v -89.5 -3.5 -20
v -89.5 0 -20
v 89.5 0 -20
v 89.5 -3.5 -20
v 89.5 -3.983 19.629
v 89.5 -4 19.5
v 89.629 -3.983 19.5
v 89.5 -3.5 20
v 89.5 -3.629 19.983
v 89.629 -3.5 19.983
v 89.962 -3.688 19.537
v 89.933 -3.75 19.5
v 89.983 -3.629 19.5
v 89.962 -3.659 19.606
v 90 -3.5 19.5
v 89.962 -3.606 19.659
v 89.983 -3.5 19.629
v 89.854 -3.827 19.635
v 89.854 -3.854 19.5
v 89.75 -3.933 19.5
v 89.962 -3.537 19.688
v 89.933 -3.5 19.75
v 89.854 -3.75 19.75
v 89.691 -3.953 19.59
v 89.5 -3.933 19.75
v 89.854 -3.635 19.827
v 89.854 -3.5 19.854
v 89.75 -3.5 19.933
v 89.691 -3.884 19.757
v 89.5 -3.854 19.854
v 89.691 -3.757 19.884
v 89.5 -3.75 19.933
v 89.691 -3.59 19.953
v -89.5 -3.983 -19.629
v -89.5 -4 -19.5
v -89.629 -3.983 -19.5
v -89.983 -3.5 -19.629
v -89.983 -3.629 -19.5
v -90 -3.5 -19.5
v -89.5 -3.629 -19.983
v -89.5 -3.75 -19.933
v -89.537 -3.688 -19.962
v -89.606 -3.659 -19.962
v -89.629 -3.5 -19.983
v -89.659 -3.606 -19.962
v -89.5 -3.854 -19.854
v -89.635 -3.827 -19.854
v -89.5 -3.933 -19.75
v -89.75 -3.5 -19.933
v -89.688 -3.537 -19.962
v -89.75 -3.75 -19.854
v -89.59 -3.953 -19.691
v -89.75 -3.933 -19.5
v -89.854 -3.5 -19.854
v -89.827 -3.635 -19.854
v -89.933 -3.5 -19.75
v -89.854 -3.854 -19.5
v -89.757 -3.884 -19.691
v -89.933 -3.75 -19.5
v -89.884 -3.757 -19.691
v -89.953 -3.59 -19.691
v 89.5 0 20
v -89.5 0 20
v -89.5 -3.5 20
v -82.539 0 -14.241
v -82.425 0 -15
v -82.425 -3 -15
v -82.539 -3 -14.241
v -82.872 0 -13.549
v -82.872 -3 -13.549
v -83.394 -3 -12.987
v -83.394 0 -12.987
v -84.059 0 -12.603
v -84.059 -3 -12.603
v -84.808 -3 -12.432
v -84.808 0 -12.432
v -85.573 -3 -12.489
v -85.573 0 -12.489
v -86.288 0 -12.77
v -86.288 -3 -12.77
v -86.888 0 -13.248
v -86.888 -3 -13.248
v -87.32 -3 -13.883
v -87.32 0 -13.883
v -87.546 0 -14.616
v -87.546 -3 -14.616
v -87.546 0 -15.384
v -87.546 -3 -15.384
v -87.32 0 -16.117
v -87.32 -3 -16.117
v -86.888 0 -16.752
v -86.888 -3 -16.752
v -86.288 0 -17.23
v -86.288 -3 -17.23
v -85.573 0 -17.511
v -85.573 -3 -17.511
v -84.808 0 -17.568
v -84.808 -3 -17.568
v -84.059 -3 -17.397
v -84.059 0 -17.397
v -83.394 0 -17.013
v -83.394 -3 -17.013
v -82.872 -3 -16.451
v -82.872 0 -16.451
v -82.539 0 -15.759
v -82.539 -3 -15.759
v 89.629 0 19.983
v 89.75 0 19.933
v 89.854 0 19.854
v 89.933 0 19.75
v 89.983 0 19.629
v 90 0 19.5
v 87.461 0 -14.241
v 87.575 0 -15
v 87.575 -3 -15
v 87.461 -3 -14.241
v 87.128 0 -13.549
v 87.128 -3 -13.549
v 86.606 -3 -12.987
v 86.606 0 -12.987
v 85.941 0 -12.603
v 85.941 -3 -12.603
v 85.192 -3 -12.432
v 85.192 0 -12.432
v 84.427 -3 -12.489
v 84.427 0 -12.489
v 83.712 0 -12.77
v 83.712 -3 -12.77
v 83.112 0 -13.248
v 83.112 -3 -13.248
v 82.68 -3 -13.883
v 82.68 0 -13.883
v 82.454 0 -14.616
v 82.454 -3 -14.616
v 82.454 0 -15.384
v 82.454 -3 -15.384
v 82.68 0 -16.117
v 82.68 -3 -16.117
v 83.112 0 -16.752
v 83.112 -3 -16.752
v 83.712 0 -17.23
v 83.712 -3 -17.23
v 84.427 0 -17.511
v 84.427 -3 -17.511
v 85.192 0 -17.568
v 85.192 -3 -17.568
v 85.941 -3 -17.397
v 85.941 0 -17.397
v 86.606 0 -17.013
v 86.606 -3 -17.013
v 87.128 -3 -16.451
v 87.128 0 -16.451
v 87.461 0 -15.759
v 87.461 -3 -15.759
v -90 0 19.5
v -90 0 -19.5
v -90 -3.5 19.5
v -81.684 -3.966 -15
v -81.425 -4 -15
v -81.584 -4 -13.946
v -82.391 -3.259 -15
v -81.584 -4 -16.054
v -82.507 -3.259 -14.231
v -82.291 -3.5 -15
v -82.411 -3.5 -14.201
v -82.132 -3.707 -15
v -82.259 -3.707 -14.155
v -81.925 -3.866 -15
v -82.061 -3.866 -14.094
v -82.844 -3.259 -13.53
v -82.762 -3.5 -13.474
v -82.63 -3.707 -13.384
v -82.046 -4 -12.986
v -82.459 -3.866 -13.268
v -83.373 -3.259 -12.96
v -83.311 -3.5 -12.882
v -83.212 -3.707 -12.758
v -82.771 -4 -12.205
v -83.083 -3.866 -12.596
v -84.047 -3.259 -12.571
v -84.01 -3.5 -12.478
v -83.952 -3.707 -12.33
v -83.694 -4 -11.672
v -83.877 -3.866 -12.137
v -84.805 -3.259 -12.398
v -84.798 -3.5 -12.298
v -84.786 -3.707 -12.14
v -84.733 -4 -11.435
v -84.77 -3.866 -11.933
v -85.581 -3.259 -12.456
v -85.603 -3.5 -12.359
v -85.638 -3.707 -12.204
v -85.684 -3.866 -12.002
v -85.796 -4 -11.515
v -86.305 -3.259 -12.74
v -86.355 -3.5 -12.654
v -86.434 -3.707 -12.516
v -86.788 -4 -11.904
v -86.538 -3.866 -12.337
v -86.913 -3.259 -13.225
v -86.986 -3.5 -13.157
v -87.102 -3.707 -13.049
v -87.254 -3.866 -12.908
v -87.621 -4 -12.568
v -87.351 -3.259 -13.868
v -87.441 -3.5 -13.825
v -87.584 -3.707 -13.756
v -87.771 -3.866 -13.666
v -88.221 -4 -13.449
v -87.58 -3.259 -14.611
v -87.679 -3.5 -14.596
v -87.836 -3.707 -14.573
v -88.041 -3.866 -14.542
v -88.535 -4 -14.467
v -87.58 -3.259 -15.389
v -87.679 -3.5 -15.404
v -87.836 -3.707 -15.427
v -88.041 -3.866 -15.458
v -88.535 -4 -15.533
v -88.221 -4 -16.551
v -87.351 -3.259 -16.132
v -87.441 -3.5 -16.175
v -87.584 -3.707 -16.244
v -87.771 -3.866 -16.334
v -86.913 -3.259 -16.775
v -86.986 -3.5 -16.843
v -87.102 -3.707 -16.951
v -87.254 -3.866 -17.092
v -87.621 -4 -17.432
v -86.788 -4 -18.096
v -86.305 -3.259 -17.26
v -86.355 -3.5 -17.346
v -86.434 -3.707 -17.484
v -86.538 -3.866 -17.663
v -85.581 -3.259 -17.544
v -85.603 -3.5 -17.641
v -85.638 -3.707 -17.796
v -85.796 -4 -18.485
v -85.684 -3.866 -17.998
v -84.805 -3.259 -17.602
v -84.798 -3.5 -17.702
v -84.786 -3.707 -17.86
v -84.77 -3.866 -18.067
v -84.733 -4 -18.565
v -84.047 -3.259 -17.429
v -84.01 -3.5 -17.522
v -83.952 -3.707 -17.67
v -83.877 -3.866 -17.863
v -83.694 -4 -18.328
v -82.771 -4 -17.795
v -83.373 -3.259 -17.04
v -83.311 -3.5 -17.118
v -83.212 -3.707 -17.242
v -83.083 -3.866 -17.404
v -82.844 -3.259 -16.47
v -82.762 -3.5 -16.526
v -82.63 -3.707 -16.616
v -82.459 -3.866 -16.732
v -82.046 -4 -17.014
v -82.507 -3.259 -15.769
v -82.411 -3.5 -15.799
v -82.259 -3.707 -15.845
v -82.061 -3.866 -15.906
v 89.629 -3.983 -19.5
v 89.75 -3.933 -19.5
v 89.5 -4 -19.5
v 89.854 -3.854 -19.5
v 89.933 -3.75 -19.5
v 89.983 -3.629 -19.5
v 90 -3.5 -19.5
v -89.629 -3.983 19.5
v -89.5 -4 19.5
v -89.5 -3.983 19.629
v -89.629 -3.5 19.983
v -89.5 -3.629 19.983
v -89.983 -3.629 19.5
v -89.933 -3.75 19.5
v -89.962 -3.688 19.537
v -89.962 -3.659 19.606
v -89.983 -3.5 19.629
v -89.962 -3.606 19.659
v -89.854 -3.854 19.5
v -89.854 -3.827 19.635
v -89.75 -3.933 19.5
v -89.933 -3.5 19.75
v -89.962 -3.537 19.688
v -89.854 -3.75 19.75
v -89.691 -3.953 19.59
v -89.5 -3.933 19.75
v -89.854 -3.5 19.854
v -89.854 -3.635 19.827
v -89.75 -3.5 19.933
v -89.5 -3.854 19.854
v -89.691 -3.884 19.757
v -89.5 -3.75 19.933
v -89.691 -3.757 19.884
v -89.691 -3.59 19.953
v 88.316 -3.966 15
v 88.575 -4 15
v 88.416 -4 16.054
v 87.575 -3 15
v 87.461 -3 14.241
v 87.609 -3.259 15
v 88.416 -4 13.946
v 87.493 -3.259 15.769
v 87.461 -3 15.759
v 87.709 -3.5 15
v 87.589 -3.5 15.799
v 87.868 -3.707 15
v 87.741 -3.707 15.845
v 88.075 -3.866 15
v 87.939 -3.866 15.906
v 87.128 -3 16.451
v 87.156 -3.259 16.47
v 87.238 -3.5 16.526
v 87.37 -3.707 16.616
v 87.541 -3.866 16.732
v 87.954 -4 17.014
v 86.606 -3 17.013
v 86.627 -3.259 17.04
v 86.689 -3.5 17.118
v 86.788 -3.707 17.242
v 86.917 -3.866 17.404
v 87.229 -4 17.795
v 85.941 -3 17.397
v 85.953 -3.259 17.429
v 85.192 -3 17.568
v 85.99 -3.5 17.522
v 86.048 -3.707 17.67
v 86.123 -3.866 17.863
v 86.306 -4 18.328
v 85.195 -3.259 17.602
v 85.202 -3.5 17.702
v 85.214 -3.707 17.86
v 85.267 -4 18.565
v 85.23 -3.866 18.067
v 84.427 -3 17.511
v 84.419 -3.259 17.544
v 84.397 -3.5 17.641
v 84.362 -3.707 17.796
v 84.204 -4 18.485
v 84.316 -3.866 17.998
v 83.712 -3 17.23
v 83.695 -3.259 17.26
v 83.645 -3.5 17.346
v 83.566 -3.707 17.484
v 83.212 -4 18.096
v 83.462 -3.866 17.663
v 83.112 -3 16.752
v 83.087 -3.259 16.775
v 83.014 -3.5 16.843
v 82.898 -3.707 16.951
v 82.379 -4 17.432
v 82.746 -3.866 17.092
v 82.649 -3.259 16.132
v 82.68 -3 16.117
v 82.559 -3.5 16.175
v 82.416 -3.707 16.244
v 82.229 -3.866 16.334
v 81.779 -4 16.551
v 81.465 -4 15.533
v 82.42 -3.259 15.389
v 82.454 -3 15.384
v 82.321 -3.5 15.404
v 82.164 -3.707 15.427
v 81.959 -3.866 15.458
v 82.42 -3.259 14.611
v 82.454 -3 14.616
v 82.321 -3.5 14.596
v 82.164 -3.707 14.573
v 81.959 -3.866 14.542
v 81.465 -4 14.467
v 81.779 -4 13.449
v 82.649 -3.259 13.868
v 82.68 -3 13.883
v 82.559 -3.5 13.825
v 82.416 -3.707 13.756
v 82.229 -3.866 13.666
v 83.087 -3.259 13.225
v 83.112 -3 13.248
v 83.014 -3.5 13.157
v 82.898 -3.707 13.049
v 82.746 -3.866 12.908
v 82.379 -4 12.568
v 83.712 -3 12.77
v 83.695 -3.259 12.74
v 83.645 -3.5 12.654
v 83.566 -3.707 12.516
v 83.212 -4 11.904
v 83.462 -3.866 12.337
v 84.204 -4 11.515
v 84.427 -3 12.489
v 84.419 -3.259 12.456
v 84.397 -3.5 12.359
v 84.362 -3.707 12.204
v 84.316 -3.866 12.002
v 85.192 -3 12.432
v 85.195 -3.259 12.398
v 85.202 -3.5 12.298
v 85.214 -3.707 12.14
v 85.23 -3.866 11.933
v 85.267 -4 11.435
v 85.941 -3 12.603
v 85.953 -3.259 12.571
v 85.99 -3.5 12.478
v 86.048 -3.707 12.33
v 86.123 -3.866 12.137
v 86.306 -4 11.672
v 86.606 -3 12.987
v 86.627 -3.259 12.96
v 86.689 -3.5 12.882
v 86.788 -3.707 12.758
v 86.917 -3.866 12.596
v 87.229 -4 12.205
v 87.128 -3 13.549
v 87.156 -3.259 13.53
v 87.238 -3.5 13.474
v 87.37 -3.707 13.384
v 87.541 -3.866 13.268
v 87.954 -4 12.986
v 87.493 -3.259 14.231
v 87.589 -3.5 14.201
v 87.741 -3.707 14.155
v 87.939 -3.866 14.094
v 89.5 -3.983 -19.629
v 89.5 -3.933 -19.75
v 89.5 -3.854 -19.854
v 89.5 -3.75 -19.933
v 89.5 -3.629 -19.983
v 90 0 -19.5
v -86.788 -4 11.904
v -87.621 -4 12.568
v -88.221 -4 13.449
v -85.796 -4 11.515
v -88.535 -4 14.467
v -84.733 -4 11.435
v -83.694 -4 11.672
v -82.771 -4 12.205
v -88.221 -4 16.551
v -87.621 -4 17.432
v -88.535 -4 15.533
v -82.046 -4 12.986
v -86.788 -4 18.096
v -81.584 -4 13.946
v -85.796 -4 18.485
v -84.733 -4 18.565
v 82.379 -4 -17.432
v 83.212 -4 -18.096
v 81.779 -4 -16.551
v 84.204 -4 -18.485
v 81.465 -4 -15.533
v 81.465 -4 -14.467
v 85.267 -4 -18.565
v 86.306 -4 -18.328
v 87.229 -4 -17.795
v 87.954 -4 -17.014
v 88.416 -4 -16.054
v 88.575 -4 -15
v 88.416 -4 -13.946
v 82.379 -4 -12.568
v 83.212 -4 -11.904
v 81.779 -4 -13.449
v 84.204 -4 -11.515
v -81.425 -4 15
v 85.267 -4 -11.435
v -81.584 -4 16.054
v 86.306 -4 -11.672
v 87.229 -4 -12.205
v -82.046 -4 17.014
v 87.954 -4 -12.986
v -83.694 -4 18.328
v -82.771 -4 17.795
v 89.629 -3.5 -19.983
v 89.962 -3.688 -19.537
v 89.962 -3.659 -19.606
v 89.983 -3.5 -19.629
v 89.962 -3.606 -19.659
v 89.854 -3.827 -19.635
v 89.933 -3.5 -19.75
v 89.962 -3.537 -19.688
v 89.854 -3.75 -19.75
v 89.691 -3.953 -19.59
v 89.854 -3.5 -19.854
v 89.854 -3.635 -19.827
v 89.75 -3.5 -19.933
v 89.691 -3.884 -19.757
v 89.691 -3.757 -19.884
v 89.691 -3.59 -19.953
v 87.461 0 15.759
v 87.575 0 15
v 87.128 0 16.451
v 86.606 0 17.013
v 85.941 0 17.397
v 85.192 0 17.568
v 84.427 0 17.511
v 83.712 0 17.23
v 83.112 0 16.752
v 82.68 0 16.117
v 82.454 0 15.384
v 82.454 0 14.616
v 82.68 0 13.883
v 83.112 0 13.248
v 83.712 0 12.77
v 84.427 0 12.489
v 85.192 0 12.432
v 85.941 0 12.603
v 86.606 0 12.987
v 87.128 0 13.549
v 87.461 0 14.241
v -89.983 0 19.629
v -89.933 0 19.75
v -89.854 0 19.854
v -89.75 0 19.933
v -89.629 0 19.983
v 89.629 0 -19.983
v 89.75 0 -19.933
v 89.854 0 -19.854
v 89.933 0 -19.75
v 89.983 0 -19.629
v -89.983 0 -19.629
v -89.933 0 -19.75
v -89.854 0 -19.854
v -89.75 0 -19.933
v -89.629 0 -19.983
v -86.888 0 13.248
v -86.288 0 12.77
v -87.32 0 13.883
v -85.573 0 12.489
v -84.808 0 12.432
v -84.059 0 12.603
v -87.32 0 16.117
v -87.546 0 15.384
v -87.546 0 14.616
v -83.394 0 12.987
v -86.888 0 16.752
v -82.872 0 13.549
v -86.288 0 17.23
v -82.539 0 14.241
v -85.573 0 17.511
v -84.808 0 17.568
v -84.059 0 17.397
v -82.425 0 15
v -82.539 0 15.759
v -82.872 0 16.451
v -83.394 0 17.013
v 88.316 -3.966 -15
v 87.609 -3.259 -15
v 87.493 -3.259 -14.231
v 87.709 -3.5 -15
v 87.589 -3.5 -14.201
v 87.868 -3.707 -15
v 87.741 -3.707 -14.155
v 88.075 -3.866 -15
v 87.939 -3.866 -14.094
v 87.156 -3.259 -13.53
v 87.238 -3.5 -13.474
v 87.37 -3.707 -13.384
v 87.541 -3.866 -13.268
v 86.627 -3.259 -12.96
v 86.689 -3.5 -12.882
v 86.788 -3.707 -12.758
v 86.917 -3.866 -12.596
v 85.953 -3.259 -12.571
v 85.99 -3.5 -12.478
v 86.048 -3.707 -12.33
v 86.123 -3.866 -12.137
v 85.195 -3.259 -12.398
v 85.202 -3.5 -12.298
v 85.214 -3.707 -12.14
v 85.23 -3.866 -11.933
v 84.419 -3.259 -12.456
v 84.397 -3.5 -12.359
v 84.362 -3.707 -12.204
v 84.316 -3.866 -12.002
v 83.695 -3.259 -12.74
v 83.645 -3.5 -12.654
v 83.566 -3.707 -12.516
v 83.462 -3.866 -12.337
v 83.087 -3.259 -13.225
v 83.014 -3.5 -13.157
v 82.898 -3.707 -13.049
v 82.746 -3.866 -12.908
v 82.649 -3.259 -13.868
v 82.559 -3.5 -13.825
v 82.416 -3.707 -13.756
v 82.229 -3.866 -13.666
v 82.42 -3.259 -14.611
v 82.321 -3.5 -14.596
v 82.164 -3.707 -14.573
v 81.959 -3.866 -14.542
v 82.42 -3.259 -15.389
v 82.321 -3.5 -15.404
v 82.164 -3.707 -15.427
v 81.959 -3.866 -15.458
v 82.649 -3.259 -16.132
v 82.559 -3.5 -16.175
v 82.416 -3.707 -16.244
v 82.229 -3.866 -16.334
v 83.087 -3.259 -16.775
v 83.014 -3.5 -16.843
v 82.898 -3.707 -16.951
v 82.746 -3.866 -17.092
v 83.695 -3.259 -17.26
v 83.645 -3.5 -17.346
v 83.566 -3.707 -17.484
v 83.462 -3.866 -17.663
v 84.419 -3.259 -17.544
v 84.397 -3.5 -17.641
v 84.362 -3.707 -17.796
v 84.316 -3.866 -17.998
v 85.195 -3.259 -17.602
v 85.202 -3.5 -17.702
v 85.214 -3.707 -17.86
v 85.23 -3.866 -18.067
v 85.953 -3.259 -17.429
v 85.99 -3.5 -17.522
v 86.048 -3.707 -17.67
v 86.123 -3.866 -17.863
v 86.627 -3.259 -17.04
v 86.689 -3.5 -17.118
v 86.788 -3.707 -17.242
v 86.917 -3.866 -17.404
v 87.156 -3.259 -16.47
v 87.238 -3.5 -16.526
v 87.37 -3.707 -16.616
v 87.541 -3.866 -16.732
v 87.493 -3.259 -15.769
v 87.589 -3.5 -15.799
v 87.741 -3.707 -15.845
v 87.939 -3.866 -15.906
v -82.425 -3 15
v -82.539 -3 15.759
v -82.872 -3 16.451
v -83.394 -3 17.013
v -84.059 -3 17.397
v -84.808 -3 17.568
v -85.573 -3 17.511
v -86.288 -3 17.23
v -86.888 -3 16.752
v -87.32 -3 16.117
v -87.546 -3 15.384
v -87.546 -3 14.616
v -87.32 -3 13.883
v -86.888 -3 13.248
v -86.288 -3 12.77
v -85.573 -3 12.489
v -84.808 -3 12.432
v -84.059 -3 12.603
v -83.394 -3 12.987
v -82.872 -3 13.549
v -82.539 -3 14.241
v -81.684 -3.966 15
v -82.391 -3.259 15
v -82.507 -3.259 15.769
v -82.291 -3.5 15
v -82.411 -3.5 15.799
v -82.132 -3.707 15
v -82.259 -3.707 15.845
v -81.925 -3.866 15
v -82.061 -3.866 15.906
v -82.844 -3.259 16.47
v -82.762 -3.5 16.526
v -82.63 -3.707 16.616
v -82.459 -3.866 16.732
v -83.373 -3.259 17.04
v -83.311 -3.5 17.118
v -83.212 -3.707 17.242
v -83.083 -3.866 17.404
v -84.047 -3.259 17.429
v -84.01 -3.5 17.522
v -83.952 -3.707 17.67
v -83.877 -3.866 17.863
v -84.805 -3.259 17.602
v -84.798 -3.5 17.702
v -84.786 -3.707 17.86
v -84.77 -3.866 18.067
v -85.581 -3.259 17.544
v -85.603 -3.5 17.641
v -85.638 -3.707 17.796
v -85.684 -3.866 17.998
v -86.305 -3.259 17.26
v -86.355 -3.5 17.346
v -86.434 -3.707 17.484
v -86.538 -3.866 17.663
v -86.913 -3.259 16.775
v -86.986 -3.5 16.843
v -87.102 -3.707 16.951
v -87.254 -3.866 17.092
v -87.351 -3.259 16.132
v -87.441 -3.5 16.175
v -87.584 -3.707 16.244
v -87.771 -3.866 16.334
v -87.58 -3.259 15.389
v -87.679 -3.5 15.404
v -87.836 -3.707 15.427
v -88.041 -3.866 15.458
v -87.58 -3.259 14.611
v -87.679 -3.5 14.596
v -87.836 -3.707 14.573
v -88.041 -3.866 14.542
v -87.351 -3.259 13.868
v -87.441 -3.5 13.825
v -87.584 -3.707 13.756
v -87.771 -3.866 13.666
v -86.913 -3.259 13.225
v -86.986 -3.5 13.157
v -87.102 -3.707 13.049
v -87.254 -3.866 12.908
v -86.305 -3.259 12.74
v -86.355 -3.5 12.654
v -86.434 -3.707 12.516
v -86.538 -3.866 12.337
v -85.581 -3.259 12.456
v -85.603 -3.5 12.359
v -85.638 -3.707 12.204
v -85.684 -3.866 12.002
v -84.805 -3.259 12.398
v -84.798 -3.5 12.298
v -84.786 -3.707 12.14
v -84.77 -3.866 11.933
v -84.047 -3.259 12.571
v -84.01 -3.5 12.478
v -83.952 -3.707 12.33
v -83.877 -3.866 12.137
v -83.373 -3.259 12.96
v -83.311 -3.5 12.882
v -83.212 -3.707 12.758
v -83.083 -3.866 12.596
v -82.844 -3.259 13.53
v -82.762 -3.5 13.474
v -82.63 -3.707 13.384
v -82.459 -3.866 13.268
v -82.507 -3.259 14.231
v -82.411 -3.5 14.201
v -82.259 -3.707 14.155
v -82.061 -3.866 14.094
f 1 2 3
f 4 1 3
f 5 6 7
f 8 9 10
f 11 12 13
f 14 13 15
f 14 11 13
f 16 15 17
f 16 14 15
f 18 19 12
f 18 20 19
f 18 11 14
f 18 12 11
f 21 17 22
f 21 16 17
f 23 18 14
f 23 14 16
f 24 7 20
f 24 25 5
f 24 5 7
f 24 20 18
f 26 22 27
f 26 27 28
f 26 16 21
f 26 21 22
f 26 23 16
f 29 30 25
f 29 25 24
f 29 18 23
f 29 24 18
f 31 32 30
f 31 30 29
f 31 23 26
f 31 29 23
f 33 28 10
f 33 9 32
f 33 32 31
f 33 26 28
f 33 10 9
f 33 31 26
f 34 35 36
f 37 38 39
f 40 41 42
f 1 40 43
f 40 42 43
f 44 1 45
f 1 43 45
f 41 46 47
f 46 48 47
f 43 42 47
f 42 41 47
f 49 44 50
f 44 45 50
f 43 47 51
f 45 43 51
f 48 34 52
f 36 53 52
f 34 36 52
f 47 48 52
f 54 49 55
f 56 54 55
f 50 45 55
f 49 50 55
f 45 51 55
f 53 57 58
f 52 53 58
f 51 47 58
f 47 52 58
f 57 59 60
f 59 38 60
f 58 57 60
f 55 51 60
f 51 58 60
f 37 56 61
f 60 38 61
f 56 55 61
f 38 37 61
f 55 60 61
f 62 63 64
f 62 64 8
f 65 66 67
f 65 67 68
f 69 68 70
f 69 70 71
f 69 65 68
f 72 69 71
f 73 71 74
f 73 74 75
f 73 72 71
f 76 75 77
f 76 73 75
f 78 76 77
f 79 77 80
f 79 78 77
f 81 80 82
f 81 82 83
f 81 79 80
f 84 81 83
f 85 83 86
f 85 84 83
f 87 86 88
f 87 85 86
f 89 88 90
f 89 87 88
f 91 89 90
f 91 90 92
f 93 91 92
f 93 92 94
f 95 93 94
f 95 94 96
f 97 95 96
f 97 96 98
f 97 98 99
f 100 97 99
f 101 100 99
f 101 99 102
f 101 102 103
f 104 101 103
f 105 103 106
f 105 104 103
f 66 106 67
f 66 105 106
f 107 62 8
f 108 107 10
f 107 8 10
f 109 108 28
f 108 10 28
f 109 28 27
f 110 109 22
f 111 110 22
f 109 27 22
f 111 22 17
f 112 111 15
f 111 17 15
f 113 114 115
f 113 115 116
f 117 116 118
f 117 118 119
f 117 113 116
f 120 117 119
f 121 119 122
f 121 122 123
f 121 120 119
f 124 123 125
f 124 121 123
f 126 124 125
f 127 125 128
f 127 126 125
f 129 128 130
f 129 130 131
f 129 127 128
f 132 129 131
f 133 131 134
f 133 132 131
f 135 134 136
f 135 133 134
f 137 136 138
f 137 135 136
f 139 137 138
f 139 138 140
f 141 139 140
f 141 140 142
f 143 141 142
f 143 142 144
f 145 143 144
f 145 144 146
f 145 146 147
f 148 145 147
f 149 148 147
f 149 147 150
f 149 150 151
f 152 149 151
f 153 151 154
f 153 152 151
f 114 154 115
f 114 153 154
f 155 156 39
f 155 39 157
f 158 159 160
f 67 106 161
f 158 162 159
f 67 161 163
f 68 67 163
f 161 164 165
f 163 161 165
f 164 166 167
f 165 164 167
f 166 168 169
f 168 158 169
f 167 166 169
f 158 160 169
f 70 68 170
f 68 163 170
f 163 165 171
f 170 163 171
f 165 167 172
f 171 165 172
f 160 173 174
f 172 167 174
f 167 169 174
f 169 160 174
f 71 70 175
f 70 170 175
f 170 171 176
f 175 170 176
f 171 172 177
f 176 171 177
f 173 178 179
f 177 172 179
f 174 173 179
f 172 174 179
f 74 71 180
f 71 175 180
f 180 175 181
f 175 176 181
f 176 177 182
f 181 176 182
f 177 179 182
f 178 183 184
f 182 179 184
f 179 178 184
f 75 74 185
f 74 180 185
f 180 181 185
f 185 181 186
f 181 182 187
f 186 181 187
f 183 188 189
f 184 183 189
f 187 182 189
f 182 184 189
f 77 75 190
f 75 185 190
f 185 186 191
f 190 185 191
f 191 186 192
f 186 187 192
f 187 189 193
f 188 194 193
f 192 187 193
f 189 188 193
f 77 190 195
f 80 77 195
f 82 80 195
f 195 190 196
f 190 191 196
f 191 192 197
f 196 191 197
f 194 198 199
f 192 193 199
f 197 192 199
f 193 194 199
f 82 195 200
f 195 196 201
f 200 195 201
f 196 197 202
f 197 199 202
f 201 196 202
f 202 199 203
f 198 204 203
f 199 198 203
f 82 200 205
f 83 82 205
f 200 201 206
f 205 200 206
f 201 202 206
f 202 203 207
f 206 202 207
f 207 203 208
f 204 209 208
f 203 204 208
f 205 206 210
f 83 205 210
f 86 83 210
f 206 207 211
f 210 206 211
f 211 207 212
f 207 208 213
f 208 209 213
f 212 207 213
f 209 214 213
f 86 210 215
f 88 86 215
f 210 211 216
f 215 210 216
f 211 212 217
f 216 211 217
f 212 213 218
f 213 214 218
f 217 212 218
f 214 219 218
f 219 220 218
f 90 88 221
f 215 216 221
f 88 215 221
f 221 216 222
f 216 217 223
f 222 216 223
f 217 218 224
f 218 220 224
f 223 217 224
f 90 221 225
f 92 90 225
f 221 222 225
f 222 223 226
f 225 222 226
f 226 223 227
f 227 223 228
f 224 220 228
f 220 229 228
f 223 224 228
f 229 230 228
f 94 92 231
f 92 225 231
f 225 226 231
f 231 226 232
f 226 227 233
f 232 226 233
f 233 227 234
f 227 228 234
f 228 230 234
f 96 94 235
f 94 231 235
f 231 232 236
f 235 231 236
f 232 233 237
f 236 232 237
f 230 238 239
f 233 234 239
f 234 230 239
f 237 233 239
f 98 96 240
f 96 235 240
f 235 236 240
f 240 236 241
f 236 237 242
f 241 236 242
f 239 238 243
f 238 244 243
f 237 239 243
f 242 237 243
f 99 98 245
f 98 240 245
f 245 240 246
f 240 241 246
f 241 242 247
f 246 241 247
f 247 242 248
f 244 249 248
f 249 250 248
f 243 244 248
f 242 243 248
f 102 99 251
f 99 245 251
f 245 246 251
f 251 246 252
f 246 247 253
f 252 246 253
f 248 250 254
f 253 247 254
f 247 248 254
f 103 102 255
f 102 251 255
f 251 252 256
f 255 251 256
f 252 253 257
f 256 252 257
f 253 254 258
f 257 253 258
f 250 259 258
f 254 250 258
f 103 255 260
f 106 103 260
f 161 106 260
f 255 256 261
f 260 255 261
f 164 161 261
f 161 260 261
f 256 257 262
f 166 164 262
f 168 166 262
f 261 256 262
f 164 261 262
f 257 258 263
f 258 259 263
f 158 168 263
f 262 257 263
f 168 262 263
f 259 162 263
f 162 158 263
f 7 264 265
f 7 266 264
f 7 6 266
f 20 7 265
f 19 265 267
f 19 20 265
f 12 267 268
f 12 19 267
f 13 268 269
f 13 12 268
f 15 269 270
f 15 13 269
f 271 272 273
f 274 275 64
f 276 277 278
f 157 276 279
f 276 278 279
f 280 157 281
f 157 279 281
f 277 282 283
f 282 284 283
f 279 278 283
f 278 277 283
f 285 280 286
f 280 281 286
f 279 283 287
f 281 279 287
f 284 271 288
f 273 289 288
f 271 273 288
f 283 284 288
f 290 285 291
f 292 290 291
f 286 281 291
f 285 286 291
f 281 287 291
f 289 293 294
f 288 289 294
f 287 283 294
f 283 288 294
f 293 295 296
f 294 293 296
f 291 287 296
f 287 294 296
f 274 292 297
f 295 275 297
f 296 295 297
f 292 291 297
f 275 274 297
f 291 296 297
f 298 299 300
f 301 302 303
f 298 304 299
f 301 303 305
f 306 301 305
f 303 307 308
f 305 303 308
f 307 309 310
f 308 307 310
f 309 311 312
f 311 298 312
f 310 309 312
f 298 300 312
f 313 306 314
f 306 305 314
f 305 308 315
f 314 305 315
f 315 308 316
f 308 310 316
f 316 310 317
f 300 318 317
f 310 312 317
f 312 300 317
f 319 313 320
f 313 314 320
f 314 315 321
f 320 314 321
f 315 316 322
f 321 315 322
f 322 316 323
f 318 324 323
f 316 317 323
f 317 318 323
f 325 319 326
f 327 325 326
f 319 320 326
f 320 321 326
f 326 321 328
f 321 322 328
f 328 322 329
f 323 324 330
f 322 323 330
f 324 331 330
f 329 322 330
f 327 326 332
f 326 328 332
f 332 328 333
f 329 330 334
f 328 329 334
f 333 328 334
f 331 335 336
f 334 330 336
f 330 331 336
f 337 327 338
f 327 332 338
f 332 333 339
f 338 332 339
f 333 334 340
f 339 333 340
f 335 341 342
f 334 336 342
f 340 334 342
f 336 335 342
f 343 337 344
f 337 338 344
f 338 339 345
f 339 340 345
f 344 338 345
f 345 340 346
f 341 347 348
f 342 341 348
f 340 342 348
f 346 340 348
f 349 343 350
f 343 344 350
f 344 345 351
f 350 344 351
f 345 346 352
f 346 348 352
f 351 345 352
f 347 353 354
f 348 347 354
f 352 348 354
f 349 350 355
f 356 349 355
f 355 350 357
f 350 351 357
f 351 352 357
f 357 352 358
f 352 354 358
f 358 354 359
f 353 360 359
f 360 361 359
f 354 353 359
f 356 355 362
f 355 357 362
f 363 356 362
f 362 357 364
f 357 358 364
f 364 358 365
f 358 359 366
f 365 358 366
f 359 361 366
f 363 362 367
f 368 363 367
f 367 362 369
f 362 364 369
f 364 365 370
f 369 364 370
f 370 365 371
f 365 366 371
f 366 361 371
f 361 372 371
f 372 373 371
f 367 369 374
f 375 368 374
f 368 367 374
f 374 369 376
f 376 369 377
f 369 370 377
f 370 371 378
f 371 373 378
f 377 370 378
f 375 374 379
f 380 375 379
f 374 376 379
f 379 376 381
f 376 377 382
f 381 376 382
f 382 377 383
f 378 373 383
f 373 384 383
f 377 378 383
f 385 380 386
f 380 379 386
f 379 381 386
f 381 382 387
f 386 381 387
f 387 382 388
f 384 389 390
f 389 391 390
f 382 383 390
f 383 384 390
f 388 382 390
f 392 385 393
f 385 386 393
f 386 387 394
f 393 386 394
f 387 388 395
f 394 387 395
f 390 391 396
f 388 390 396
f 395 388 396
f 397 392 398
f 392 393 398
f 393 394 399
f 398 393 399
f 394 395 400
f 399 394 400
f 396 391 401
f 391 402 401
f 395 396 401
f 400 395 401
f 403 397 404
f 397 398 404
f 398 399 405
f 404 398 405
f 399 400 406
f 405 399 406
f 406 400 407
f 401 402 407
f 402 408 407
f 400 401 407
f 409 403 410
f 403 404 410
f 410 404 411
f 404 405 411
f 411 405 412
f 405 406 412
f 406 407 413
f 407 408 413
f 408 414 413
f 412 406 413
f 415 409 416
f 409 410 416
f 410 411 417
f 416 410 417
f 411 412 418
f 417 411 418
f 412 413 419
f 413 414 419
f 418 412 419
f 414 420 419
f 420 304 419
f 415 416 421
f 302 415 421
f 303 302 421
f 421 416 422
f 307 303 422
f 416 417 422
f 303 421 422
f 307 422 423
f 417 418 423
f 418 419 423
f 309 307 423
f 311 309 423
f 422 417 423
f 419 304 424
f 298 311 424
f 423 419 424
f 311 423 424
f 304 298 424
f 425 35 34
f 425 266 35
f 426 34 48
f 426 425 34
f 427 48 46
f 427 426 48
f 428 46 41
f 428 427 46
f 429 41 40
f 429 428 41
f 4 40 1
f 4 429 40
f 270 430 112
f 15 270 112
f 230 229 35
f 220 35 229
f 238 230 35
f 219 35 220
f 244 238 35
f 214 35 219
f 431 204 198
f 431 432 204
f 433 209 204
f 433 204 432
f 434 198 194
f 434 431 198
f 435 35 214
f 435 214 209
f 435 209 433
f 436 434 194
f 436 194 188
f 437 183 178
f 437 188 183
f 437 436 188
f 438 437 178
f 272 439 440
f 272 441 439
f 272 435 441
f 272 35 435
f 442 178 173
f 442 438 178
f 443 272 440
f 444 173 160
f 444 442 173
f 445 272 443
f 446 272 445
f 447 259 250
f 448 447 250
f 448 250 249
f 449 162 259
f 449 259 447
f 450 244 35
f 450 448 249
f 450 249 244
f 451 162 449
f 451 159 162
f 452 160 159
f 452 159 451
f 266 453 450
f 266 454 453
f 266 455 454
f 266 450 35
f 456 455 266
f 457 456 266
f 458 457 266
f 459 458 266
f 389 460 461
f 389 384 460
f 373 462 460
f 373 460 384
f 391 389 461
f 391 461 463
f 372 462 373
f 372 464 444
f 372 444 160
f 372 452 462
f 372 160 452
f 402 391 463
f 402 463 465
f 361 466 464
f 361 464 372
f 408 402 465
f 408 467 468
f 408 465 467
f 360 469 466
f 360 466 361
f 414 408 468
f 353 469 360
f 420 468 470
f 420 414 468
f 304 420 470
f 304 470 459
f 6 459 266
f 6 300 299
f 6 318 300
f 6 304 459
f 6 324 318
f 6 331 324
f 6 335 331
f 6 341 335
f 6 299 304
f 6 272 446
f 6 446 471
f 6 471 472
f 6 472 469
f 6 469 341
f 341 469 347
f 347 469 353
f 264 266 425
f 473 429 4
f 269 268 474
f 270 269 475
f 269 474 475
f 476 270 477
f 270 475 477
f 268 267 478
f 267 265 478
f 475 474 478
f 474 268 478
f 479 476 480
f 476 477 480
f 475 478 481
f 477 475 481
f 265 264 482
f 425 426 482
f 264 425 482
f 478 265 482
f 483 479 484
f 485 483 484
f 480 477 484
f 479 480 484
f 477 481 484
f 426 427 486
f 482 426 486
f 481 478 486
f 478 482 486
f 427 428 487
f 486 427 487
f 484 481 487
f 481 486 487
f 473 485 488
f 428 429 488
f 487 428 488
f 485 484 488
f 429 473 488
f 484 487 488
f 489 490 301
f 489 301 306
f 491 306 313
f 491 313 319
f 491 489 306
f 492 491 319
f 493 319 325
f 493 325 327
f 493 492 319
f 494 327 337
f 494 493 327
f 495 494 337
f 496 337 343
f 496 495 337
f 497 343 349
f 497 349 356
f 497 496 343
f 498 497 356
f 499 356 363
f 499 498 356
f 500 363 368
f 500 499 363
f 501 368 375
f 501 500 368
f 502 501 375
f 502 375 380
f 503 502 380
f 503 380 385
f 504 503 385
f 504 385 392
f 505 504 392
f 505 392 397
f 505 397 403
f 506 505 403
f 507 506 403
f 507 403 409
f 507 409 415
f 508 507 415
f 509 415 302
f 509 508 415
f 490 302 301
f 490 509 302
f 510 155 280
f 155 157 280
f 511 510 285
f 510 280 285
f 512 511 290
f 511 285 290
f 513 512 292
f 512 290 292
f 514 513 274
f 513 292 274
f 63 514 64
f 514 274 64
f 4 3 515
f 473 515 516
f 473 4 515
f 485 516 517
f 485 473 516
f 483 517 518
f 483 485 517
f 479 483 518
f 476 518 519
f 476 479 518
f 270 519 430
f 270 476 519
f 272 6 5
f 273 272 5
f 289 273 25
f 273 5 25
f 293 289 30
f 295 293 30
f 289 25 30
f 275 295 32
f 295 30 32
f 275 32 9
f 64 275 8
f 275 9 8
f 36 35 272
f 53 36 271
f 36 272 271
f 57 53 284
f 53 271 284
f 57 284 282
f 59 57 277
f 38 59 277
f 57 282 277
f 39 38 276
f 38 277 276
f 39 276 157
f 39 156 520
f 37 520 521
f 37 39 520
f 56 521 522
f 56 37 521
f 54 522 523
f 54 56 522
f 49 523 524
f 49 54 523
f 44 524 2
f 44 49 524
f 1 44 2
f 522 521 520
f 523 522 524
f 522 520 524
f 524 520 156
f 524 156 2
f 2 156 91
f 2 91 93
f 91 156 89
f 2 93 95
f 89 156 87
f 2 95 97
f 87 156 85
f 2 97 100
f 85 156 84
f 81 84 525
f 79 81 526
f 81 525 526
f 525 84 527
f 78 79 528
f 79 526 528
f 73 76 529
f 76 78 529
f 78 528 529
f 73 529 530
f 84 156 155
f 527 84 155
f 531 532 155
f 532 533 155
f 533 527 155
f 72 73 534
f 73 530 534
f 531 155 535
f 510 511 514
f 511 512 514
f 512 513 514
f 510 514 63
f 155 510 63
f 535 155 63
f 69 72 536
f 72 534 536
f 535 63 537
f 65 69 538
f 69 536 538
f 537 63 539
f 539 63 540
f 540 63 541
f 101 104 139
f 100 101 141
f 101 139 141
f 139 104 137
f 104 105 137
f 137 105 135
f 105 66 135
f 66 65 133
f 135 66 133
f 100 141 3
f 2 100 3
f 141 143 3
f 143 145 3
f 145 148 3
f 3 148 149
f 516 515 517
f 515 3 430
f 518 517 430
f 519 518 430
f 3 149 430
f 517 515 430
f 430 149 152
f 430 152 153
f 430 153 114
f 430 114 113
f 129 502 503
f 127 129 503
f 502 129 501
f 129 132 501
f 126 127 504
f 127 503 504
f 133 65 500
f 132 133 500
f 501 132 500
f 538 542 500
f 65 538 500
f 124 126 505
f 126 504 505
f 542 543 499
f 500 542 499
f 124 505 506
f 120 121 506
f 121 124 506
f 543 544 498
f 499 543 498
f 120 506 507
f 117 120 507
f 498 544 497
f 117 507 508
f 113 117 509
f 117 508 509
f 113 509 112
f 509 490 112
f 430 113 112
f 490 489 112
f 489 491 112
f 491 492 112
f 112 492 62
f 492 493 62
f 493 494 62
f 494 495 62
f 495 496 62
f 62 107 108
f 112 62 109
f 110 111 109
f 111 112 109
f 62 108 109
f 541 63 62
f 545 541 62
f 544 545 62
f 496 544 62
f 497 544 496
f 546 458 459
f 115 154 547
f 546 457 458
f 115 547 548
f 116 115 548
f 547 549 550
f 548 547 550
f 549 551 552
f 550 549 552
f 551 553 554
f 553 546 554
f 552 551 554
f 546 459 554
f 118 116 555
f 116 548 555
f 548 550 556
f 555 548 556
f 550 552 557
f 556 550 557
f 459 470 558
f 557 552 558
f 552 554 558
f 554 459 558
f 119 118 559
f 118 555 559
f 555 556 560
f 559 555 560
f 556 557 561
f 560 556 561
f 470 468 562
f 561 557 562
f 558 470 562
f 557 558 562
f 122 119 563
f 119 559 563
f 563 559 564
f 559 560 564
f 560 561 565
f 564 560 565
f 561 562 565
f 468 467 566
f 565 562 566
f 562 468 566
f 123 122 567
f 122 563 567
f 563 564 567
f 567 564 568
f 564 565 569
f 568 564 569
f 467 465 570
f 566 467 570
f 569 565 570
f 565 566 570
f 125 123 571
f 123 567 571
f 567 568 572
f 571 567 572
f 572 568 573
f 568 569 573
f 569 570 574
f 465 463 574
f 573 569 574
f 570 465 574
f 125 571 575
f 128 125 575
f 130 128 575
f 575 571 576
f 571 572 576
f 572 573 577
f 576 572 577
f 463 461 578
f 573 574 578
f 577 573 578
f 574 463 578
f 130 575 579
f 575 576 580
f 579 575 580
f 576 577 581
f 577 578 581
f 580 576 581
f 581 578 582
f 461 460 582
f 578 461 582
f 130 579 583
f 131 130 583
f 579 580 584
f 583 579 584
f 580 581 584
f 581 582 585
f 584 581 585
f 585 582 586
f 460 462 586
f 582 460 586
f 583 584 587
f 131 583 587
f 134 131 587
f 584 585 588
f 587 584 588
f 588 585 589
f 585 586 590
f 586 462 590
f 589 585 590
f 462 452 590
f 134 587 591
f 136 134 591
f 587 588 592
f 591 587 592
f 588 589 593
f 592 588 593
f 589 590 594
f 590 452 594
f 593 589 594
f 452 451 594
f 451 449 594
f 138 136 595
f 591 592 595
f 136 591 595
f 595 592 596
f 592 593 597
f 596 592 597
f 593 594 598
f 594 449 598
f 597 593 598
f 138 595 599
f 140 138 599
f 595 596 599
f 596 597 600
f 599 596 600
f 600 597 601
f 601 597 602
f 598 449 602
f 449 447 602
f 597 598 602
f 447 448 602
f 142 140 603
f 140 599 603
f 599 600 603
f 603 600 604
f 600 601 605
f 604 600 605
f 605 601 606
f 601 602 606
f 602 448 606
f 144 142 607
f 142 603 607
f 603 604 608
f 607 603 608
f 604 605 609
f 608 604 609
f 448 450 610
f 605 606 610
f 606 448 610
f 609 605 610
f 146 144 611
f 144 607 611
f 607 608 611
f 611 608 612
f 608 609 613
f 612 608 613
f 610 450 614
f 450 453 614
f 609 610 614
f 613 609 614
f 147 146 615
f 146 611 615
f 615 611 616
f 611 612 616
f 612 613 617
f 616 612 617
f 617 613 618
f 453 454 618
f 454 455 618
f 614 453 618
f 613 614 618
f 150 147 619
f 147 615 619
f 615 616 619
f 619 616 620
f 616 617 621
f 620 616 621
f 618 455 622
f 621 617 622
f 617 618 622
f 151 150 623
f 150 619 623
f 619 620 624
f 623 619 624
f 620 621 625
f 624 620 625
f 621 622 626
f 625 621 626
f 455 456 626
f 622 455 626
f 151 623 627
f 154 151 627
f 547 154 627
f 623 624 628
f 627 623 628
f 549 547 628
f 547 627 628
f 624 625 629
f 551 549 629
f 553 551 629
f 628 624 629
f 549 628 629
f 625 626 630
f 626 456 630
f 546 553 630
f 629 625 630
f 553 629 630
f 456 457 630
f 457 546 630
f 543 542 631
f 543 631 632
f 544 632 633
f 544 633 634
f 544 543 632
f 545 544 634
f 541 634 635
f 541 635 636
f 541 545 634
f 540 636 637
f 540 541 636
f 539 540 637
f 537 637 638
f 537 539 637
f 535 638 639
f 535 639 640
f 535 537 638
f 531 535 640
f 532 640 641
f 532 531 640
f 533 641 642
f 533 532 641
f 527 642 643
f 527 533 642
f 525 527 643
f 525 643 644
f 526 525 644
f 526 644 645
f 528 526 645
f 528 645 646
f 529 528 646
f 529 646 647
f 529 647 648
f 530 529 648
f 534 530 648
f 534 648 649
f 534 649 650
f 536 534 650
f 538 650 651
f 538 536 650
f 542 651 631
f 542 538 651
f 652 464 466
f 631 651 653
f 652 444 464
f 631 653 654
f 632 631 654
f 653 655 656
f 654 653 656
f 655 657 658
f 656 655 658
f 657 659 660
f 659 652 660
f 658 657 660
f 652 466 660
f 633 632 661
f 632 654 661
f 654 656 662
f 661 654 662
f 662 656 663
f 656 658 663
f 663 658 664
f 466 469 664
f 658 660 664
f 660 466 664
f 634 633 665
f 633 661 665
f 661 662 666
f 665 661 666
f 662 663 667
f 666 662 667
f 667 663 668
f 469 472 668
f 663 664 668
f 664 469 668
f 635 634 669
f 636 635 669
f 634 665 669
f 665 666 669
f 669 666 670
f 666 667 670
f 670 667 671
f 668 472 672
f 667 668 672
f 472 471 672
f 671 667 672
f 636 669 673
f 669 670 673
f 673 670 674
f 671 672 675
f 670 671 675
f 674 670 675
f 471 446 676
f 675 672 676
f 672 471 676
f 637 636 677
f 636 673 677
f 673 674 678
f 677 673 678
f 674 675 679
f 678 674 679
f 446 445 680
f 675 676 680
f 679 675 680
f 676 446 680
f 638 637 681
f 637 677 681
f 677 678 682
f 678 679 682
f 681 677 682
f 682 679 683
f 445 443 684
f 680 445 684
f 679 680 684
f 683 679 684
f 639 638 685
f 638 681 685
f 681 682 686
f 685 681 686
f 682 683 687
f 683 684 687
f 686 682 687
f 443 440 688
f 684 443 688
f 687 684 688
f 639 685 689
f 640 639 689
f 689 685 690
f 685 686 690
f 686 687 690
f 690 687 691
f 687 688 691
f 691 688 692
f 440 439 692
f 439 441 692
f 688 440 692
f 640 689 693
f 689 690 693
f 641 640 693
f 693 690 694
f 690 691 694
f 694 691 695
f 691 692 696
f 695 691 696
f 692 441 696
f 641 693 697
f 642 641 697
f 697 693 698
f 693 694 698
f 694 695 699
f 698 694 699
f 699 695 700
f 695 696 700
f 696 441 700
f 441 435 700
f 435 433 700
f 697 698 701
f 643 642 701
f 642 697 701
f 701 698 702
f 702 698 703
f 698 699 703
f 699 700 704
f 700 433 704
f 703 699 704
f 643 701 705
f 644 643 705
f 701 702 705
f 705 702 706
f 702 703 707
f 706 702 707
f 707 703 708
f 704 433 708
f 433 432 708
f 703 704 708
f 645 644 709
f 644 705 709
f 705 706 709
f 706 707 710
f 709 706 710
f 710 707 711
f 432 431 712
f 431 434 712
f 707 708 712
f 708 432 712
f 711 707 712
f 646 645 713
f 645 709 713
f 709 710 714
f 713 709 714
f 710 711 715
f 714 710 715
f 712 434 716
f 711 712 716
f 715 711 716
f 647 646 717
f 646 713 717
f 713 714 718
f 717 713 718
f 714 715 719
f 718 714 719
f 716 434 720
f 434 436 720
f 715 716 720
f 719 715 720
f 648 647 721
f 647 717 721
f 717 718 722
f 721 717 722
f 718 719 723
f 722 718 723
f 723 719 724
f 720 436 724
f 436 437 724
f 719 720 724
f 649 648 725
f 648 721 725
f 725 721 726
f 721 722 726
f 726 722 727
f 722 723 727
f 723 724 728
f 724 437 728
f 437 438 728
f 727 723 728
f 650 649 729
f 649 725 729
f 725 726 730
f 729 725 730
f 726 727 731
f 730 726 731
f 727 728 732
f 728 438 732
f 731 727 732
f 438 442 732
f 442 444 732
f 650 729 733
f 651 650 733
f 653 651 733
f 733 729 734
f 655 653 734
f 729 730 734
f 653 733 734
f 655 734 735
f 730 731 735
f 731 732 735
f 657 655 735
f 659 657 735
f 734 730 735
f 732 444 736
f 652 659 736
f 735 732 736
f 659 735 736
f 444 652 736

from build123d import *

# Parameters (mm, degrees)
F0_W     = 180
F0_H     = 40
F0_R     = 2.5751263091
F1_DEPTH = 4
F2_R     = 1
F3_R     = 0.5


# Not quite as in the source:
# - a feature names something its author has since deleted; it is built from what else it names


with BuildPart() as f1:
    # F0 (on Front) → F1 (new body)
    with BuildSketch(Plane.XZ):
        Rectangle(F0_W, F0_H)
        with Locations((-85, -15)):
            Circle(F0_R, mode=Mode.SUBTRACT)
        with Locations((85, -15)):
            Circle(F0_R, mode=Mode.SUBTRACT)
        with Locations((-85, 15)):
            Circle(F0_R, mode=Mode.SUBTRACT)
        with Locations((85, 15)):
            Circle(F0_R, mode=Mode.SUBTRACT)
    extrude(amount=F1_DEPTH)

    # F2
    f2_edges = [f1.edges().sort_by_distance(p)[0] for p in [
        (-87.575126, -4, 15),
        (-87.575126, -4, -15),
        (82.424874, -4, 15),
        (82.424874, -4, -15),
    ]]
    fillet(f2_edges, radius=F2_R)

    # F3
    f3_edges = [f1.edges().sort_by_distance(p)[0] for p in [
        (0, -4, 20),
        (-90, -4, 0),
        (0, -4, -20),
        (90, -4, 0),
        (-90, -2, 20),
        (-90, -2, -20),
        (90, -2, 20),
        (90, -2, -20),
    ]]
    fillet(f3_edges, radius=F3_R)


solid = f1.part
